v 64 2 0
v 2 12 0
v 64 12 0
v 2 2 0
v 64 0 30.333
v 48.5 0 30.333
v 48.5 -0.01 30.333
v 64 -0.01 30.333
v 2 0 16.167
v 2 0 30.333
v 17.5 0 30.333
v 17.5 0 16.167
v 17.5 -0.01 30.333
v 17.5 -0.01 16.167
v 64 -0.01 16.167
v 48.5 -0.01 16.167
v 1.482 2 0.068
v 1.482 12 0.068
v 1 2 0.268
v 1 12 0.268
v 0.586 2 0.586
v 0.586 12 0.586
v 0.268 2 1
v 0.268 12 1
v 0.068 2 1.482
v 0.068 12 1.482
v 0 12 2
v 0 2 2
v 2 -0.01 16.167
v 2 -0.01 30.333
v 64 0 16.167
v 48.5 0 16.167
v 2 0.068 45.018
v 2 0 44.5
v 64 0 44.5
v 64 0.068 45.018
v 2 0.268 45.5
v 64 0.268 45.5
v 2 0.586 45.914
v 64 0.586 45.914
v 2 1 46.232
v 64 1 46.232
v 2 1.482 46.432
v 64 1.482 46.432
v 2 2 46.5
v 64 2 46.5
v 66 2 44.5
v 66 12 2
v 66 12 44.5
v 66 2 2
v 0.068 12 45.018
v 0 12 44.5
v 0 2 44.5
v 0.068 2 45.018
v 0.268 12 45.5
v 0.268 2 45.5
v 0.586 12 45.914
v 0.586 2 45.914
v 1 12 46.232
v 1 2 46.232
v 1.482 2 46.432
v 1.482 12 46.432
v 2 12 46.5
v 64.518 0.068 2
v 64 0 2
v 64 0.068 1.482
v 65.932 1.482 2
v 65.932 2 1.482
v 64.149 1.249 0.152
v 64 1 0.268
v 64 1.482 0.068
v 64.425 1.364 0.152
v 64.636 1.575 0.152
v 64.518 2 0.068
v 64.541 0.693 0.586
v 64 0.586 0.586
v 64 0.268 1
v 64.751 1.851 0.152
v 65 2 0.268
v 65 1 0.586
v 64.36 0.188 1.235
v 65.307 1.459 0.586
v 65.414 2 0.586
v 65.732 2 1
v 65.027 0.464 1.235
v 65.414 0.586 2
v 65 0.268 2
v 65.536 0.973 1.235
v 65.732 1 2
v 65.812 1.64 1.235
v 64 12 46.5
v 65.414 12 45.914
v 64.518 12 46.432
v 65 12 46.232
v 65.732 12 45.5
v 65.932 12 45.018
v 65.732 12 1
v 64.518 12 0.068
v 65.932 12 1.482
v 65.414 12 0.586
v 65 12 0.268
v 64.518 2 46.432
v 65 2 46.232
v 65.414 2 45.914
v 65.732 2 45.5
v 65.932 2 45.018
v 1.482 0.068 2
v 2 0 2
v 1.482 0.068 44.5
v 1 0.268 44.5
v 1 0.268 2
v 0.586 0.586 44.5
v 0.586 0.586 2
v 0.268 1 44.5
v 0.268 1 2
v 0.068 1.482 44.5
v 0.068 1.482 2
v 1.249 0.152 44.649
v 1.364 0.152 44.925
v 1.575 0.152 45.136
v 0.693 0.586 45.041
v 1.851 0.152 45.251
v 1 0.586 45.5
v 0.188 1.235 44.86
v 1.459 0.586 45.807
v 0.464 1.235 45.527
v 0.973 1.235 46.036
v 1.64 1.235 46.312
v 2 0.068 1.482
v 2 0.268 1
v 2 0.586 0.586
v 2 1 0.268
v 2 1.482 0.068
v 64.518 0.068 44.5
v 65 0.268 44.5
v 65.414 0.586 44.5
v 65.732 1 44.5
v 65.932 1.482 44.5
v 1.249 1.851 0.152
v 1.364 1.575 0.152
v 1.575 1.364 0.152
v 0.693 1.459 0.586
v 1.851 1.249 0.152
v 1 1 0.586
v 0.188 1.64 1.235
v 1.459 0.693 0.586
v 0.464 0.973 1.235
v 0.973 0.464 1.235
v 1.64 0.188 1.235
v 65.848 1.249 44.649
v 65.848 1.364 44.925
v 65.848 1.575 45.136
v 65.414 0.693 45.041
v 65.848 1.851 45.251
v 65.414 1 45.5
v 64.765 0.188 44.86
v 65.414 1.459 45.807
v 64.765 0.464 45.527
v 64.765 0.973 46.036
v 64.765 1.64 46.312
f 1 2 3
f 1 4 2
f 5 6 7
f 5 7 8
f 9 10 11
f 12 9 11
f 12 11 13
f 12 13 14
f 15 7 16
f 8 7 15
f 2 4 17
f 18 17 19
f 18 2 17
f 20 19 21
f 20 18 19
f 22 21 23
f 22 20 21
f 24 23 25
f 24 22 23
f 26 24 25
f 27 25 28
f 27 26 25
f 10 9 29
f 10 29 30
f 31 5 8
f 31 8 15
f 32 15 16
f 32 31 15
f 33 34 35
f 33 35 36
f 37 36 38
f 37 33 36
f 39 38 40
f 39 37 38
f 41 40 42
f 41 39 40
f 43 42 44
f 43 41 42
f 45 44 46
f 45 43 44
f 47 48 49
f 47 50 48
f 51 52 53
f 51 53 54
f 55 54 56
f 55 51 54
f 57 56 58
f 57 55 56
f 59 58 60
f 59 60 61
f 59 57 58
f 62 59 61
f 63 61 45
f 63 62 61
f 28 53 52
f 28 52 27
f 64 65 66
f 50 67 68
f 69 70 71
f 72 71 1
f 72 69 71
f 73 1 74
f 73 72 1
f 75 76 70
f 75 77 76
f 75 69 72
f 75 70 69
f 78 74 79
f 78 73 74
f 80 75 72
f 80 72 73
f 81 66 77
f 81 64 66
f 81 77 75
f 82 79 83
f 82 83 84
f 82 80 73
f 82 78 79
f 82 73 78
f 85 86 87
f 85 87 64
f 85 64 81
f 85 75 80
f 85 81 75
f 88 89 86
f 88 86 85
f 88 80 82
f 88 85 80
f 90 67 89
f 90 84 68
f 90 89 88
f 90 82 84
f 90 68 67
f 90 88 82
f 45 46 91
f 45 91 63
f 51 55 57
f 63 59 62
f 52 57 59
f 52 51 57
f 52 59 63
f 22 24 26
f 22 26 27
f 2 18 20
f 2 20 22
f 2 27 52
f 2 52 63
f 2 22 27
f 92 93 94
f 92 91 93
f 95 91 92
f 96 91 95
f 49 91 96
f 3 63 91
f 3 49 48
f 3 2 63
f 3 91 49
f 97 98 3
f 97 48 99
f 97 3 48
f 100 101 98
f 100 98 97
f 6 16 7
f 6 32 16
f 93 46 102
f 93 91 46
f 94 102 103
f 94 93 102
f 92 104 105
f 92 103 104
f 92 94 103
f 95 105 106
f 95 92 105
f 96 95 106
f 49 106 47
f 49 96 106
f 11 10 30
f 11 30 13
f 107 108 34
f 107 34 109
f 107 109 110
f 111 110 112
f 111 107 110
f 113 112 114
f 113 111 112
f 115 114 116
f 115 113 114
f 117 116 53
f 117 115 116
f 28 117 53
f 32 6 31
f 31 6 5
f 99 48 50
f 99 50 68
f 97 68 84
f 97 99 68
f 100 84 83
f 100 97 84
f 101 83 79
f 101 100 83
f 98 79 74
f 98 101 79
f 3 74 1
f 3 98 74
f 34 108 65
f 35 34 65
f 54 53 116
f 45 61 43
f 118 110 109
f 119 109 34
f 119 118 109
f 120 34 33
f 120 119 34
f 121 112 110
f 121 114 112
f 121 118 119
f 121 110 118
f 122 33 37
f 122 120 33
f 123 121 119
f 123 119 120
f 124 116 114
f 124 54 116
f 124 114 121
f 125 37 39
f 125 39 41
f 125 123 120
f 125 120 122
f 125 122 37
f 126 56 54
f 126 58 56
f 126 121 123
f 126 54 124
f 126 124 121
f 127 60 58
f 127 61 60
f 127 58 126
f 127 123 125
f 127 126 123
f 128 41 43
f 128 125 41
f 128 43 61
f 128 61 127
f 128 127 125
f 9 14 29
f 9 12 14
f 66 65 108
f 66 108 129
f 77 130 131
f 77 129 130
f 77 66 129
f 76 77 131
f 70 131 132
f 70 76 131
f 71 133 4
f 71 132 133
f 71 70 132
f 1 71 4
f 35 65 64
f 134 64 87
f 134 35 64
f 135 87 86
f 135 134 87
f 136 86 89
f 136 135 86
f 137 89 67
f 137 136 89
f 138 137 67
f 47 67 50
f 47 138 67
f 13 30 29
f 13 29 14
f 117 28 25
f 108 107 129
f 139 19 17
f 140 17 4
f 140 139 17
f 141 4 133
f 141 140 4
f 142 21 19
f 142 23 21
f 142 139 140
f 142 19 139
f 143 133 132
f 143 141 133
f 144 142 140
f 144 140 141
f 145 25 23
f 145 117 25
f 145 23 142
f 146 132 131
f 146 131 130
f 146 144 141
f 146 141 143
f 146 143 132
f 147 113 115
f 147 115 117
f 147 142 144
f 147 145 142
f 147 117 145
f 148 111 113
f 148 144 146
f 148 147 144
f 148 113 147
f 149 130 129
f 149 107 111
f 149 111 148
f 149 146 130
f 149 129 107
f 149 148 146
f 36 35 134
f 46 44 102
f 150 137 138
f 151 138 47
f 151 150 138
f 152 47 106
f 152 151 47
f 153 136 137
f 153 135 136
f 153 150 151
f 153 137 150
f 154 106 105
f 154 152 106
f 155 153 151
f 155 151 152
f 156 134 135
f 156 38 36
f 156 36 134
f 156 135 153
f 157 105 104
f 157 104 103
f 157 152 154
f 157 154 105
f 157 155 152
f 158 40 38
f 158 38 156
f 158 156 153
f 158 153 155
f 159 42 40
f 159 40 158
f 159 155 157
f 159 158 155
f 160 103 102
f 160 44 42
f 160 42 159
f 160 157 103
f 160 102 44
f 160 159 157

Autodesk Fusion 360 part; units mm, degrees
sketch "Nose Plate" plane through (0, 0, 0) normal (0, 1, 0) x (1, 0, 0)
  line L0 (0, 0) -> (66, 0)
  line L1 (66, 0) -> (66, -46.5)
  line L2 (66, -46.5) -> (0, -46.5)
  line L3 (0, -46.5) -> (0, 0)
  dimension "d5" = 66
  dimension "d6" = 46.5
extrude "Extrude1" add sketch "Nose Plate" along normal blind 12 makes body 1
sketch "Nostrils" plane through (0, 0, 0) normal (0, -1, 0) x (1, 0, 0)
  line L0 (66, 46.5) -> (0, 46.5)
  line L1 (0, 46.5) -> (0, 0)
  line L2 (0, 0) -> (66, 0)
  line L3 (66, 0) -> (66, 46.5)
  line L4 (2, 30.3333) -> (17.5, 30.3333)
  line L5 (17.5, 30.3333) -> (17.5, 16.1667)
  line L6 (17.5, 16.1667) -> (2, 16.1667)
  line L7 (2, 16.1667) -> (2, 30.3333)
  line L8 (48.5, 30.3333) -> (64, 30.3333)
  line L9 (64, 30.3333) -> (64, 16.1667)
  line L10 (64, 16.1667) -> (48.5, 16.1667)
  line L11 (48.5, 16.1667) -> (48.5, 30.3333)
  dimension "d22" = 15.5
  dimension "d23" = 15.5
  dimension "d24" = 31
  dimension "d25" = 14.1667
  dimension "d26" = 14.1667
  dimension "d27" = 16.1667
  dimension "d28" = 16.1667
  dimension "d39" = 2
  dimension "d40" = 2
extrude "Extrude4" add sketch "Nostrils" along normal blind 0.01 separate body contours L4 L5 L6 L7 | L8 L9 L10 L11 makes body 2 at (7.1667, 0, 25.6111) makes body 3 at (53.6667, 0, 20.8889)
fillet "Fillet1" radius 2 8 edges at (0, 6, 46.5) (0, 0, 23.25) (33, 0, 46.5) (66, 6, 46.5) (66, 0, 23.25) (66, 6, 0) (33, 0, 0) (0, 6, 0) on bodies 1
equation "block_size = 16 mm"
equation "pine_thickness = 12 mm"
equation "nose_plate_height = 3 * face_block_height"
equation "nose_plate_width = 4 * face_block_width"
equation "d5 = nose_plate_width"
equation "d6 = nose_plate_height"
equation "d7 = pine_thickness"
equation "nostril_block_width = ( nose_plate_width - 2 * fillet_radius ) / 4"
equation "d22 = nostril_block_width"
equation "d23 = nostril_block_width"
equation "d25 = nostril_block_height"
equation "d26 = nostril_block_height"
equation "d27 = nostril_block_height + fillet_radius"
equation "d28 = nostril_block_height + fillet_radius"
equation "front_face_plate_height = 8 * block_size"
equation "front_face_plate_width = 10 * block_size - 2 * pine_thickness"
equation "face_block_width = ( front_face_plate_width - 2 * fillet_radius ) / 8"
equation "fillet_radius = 2 mm"
equation "face_block_height = ( front_face_plate_height - 2 * fillet_radius ) / 8"
equation "nostril_block_height = ( nose_plate_height - 2 * fillet_radius ) / 3"
equation "d39 = fillet_radius"
equation "d40 = fillet_radius"
equation "d44 = fillet_radius"
